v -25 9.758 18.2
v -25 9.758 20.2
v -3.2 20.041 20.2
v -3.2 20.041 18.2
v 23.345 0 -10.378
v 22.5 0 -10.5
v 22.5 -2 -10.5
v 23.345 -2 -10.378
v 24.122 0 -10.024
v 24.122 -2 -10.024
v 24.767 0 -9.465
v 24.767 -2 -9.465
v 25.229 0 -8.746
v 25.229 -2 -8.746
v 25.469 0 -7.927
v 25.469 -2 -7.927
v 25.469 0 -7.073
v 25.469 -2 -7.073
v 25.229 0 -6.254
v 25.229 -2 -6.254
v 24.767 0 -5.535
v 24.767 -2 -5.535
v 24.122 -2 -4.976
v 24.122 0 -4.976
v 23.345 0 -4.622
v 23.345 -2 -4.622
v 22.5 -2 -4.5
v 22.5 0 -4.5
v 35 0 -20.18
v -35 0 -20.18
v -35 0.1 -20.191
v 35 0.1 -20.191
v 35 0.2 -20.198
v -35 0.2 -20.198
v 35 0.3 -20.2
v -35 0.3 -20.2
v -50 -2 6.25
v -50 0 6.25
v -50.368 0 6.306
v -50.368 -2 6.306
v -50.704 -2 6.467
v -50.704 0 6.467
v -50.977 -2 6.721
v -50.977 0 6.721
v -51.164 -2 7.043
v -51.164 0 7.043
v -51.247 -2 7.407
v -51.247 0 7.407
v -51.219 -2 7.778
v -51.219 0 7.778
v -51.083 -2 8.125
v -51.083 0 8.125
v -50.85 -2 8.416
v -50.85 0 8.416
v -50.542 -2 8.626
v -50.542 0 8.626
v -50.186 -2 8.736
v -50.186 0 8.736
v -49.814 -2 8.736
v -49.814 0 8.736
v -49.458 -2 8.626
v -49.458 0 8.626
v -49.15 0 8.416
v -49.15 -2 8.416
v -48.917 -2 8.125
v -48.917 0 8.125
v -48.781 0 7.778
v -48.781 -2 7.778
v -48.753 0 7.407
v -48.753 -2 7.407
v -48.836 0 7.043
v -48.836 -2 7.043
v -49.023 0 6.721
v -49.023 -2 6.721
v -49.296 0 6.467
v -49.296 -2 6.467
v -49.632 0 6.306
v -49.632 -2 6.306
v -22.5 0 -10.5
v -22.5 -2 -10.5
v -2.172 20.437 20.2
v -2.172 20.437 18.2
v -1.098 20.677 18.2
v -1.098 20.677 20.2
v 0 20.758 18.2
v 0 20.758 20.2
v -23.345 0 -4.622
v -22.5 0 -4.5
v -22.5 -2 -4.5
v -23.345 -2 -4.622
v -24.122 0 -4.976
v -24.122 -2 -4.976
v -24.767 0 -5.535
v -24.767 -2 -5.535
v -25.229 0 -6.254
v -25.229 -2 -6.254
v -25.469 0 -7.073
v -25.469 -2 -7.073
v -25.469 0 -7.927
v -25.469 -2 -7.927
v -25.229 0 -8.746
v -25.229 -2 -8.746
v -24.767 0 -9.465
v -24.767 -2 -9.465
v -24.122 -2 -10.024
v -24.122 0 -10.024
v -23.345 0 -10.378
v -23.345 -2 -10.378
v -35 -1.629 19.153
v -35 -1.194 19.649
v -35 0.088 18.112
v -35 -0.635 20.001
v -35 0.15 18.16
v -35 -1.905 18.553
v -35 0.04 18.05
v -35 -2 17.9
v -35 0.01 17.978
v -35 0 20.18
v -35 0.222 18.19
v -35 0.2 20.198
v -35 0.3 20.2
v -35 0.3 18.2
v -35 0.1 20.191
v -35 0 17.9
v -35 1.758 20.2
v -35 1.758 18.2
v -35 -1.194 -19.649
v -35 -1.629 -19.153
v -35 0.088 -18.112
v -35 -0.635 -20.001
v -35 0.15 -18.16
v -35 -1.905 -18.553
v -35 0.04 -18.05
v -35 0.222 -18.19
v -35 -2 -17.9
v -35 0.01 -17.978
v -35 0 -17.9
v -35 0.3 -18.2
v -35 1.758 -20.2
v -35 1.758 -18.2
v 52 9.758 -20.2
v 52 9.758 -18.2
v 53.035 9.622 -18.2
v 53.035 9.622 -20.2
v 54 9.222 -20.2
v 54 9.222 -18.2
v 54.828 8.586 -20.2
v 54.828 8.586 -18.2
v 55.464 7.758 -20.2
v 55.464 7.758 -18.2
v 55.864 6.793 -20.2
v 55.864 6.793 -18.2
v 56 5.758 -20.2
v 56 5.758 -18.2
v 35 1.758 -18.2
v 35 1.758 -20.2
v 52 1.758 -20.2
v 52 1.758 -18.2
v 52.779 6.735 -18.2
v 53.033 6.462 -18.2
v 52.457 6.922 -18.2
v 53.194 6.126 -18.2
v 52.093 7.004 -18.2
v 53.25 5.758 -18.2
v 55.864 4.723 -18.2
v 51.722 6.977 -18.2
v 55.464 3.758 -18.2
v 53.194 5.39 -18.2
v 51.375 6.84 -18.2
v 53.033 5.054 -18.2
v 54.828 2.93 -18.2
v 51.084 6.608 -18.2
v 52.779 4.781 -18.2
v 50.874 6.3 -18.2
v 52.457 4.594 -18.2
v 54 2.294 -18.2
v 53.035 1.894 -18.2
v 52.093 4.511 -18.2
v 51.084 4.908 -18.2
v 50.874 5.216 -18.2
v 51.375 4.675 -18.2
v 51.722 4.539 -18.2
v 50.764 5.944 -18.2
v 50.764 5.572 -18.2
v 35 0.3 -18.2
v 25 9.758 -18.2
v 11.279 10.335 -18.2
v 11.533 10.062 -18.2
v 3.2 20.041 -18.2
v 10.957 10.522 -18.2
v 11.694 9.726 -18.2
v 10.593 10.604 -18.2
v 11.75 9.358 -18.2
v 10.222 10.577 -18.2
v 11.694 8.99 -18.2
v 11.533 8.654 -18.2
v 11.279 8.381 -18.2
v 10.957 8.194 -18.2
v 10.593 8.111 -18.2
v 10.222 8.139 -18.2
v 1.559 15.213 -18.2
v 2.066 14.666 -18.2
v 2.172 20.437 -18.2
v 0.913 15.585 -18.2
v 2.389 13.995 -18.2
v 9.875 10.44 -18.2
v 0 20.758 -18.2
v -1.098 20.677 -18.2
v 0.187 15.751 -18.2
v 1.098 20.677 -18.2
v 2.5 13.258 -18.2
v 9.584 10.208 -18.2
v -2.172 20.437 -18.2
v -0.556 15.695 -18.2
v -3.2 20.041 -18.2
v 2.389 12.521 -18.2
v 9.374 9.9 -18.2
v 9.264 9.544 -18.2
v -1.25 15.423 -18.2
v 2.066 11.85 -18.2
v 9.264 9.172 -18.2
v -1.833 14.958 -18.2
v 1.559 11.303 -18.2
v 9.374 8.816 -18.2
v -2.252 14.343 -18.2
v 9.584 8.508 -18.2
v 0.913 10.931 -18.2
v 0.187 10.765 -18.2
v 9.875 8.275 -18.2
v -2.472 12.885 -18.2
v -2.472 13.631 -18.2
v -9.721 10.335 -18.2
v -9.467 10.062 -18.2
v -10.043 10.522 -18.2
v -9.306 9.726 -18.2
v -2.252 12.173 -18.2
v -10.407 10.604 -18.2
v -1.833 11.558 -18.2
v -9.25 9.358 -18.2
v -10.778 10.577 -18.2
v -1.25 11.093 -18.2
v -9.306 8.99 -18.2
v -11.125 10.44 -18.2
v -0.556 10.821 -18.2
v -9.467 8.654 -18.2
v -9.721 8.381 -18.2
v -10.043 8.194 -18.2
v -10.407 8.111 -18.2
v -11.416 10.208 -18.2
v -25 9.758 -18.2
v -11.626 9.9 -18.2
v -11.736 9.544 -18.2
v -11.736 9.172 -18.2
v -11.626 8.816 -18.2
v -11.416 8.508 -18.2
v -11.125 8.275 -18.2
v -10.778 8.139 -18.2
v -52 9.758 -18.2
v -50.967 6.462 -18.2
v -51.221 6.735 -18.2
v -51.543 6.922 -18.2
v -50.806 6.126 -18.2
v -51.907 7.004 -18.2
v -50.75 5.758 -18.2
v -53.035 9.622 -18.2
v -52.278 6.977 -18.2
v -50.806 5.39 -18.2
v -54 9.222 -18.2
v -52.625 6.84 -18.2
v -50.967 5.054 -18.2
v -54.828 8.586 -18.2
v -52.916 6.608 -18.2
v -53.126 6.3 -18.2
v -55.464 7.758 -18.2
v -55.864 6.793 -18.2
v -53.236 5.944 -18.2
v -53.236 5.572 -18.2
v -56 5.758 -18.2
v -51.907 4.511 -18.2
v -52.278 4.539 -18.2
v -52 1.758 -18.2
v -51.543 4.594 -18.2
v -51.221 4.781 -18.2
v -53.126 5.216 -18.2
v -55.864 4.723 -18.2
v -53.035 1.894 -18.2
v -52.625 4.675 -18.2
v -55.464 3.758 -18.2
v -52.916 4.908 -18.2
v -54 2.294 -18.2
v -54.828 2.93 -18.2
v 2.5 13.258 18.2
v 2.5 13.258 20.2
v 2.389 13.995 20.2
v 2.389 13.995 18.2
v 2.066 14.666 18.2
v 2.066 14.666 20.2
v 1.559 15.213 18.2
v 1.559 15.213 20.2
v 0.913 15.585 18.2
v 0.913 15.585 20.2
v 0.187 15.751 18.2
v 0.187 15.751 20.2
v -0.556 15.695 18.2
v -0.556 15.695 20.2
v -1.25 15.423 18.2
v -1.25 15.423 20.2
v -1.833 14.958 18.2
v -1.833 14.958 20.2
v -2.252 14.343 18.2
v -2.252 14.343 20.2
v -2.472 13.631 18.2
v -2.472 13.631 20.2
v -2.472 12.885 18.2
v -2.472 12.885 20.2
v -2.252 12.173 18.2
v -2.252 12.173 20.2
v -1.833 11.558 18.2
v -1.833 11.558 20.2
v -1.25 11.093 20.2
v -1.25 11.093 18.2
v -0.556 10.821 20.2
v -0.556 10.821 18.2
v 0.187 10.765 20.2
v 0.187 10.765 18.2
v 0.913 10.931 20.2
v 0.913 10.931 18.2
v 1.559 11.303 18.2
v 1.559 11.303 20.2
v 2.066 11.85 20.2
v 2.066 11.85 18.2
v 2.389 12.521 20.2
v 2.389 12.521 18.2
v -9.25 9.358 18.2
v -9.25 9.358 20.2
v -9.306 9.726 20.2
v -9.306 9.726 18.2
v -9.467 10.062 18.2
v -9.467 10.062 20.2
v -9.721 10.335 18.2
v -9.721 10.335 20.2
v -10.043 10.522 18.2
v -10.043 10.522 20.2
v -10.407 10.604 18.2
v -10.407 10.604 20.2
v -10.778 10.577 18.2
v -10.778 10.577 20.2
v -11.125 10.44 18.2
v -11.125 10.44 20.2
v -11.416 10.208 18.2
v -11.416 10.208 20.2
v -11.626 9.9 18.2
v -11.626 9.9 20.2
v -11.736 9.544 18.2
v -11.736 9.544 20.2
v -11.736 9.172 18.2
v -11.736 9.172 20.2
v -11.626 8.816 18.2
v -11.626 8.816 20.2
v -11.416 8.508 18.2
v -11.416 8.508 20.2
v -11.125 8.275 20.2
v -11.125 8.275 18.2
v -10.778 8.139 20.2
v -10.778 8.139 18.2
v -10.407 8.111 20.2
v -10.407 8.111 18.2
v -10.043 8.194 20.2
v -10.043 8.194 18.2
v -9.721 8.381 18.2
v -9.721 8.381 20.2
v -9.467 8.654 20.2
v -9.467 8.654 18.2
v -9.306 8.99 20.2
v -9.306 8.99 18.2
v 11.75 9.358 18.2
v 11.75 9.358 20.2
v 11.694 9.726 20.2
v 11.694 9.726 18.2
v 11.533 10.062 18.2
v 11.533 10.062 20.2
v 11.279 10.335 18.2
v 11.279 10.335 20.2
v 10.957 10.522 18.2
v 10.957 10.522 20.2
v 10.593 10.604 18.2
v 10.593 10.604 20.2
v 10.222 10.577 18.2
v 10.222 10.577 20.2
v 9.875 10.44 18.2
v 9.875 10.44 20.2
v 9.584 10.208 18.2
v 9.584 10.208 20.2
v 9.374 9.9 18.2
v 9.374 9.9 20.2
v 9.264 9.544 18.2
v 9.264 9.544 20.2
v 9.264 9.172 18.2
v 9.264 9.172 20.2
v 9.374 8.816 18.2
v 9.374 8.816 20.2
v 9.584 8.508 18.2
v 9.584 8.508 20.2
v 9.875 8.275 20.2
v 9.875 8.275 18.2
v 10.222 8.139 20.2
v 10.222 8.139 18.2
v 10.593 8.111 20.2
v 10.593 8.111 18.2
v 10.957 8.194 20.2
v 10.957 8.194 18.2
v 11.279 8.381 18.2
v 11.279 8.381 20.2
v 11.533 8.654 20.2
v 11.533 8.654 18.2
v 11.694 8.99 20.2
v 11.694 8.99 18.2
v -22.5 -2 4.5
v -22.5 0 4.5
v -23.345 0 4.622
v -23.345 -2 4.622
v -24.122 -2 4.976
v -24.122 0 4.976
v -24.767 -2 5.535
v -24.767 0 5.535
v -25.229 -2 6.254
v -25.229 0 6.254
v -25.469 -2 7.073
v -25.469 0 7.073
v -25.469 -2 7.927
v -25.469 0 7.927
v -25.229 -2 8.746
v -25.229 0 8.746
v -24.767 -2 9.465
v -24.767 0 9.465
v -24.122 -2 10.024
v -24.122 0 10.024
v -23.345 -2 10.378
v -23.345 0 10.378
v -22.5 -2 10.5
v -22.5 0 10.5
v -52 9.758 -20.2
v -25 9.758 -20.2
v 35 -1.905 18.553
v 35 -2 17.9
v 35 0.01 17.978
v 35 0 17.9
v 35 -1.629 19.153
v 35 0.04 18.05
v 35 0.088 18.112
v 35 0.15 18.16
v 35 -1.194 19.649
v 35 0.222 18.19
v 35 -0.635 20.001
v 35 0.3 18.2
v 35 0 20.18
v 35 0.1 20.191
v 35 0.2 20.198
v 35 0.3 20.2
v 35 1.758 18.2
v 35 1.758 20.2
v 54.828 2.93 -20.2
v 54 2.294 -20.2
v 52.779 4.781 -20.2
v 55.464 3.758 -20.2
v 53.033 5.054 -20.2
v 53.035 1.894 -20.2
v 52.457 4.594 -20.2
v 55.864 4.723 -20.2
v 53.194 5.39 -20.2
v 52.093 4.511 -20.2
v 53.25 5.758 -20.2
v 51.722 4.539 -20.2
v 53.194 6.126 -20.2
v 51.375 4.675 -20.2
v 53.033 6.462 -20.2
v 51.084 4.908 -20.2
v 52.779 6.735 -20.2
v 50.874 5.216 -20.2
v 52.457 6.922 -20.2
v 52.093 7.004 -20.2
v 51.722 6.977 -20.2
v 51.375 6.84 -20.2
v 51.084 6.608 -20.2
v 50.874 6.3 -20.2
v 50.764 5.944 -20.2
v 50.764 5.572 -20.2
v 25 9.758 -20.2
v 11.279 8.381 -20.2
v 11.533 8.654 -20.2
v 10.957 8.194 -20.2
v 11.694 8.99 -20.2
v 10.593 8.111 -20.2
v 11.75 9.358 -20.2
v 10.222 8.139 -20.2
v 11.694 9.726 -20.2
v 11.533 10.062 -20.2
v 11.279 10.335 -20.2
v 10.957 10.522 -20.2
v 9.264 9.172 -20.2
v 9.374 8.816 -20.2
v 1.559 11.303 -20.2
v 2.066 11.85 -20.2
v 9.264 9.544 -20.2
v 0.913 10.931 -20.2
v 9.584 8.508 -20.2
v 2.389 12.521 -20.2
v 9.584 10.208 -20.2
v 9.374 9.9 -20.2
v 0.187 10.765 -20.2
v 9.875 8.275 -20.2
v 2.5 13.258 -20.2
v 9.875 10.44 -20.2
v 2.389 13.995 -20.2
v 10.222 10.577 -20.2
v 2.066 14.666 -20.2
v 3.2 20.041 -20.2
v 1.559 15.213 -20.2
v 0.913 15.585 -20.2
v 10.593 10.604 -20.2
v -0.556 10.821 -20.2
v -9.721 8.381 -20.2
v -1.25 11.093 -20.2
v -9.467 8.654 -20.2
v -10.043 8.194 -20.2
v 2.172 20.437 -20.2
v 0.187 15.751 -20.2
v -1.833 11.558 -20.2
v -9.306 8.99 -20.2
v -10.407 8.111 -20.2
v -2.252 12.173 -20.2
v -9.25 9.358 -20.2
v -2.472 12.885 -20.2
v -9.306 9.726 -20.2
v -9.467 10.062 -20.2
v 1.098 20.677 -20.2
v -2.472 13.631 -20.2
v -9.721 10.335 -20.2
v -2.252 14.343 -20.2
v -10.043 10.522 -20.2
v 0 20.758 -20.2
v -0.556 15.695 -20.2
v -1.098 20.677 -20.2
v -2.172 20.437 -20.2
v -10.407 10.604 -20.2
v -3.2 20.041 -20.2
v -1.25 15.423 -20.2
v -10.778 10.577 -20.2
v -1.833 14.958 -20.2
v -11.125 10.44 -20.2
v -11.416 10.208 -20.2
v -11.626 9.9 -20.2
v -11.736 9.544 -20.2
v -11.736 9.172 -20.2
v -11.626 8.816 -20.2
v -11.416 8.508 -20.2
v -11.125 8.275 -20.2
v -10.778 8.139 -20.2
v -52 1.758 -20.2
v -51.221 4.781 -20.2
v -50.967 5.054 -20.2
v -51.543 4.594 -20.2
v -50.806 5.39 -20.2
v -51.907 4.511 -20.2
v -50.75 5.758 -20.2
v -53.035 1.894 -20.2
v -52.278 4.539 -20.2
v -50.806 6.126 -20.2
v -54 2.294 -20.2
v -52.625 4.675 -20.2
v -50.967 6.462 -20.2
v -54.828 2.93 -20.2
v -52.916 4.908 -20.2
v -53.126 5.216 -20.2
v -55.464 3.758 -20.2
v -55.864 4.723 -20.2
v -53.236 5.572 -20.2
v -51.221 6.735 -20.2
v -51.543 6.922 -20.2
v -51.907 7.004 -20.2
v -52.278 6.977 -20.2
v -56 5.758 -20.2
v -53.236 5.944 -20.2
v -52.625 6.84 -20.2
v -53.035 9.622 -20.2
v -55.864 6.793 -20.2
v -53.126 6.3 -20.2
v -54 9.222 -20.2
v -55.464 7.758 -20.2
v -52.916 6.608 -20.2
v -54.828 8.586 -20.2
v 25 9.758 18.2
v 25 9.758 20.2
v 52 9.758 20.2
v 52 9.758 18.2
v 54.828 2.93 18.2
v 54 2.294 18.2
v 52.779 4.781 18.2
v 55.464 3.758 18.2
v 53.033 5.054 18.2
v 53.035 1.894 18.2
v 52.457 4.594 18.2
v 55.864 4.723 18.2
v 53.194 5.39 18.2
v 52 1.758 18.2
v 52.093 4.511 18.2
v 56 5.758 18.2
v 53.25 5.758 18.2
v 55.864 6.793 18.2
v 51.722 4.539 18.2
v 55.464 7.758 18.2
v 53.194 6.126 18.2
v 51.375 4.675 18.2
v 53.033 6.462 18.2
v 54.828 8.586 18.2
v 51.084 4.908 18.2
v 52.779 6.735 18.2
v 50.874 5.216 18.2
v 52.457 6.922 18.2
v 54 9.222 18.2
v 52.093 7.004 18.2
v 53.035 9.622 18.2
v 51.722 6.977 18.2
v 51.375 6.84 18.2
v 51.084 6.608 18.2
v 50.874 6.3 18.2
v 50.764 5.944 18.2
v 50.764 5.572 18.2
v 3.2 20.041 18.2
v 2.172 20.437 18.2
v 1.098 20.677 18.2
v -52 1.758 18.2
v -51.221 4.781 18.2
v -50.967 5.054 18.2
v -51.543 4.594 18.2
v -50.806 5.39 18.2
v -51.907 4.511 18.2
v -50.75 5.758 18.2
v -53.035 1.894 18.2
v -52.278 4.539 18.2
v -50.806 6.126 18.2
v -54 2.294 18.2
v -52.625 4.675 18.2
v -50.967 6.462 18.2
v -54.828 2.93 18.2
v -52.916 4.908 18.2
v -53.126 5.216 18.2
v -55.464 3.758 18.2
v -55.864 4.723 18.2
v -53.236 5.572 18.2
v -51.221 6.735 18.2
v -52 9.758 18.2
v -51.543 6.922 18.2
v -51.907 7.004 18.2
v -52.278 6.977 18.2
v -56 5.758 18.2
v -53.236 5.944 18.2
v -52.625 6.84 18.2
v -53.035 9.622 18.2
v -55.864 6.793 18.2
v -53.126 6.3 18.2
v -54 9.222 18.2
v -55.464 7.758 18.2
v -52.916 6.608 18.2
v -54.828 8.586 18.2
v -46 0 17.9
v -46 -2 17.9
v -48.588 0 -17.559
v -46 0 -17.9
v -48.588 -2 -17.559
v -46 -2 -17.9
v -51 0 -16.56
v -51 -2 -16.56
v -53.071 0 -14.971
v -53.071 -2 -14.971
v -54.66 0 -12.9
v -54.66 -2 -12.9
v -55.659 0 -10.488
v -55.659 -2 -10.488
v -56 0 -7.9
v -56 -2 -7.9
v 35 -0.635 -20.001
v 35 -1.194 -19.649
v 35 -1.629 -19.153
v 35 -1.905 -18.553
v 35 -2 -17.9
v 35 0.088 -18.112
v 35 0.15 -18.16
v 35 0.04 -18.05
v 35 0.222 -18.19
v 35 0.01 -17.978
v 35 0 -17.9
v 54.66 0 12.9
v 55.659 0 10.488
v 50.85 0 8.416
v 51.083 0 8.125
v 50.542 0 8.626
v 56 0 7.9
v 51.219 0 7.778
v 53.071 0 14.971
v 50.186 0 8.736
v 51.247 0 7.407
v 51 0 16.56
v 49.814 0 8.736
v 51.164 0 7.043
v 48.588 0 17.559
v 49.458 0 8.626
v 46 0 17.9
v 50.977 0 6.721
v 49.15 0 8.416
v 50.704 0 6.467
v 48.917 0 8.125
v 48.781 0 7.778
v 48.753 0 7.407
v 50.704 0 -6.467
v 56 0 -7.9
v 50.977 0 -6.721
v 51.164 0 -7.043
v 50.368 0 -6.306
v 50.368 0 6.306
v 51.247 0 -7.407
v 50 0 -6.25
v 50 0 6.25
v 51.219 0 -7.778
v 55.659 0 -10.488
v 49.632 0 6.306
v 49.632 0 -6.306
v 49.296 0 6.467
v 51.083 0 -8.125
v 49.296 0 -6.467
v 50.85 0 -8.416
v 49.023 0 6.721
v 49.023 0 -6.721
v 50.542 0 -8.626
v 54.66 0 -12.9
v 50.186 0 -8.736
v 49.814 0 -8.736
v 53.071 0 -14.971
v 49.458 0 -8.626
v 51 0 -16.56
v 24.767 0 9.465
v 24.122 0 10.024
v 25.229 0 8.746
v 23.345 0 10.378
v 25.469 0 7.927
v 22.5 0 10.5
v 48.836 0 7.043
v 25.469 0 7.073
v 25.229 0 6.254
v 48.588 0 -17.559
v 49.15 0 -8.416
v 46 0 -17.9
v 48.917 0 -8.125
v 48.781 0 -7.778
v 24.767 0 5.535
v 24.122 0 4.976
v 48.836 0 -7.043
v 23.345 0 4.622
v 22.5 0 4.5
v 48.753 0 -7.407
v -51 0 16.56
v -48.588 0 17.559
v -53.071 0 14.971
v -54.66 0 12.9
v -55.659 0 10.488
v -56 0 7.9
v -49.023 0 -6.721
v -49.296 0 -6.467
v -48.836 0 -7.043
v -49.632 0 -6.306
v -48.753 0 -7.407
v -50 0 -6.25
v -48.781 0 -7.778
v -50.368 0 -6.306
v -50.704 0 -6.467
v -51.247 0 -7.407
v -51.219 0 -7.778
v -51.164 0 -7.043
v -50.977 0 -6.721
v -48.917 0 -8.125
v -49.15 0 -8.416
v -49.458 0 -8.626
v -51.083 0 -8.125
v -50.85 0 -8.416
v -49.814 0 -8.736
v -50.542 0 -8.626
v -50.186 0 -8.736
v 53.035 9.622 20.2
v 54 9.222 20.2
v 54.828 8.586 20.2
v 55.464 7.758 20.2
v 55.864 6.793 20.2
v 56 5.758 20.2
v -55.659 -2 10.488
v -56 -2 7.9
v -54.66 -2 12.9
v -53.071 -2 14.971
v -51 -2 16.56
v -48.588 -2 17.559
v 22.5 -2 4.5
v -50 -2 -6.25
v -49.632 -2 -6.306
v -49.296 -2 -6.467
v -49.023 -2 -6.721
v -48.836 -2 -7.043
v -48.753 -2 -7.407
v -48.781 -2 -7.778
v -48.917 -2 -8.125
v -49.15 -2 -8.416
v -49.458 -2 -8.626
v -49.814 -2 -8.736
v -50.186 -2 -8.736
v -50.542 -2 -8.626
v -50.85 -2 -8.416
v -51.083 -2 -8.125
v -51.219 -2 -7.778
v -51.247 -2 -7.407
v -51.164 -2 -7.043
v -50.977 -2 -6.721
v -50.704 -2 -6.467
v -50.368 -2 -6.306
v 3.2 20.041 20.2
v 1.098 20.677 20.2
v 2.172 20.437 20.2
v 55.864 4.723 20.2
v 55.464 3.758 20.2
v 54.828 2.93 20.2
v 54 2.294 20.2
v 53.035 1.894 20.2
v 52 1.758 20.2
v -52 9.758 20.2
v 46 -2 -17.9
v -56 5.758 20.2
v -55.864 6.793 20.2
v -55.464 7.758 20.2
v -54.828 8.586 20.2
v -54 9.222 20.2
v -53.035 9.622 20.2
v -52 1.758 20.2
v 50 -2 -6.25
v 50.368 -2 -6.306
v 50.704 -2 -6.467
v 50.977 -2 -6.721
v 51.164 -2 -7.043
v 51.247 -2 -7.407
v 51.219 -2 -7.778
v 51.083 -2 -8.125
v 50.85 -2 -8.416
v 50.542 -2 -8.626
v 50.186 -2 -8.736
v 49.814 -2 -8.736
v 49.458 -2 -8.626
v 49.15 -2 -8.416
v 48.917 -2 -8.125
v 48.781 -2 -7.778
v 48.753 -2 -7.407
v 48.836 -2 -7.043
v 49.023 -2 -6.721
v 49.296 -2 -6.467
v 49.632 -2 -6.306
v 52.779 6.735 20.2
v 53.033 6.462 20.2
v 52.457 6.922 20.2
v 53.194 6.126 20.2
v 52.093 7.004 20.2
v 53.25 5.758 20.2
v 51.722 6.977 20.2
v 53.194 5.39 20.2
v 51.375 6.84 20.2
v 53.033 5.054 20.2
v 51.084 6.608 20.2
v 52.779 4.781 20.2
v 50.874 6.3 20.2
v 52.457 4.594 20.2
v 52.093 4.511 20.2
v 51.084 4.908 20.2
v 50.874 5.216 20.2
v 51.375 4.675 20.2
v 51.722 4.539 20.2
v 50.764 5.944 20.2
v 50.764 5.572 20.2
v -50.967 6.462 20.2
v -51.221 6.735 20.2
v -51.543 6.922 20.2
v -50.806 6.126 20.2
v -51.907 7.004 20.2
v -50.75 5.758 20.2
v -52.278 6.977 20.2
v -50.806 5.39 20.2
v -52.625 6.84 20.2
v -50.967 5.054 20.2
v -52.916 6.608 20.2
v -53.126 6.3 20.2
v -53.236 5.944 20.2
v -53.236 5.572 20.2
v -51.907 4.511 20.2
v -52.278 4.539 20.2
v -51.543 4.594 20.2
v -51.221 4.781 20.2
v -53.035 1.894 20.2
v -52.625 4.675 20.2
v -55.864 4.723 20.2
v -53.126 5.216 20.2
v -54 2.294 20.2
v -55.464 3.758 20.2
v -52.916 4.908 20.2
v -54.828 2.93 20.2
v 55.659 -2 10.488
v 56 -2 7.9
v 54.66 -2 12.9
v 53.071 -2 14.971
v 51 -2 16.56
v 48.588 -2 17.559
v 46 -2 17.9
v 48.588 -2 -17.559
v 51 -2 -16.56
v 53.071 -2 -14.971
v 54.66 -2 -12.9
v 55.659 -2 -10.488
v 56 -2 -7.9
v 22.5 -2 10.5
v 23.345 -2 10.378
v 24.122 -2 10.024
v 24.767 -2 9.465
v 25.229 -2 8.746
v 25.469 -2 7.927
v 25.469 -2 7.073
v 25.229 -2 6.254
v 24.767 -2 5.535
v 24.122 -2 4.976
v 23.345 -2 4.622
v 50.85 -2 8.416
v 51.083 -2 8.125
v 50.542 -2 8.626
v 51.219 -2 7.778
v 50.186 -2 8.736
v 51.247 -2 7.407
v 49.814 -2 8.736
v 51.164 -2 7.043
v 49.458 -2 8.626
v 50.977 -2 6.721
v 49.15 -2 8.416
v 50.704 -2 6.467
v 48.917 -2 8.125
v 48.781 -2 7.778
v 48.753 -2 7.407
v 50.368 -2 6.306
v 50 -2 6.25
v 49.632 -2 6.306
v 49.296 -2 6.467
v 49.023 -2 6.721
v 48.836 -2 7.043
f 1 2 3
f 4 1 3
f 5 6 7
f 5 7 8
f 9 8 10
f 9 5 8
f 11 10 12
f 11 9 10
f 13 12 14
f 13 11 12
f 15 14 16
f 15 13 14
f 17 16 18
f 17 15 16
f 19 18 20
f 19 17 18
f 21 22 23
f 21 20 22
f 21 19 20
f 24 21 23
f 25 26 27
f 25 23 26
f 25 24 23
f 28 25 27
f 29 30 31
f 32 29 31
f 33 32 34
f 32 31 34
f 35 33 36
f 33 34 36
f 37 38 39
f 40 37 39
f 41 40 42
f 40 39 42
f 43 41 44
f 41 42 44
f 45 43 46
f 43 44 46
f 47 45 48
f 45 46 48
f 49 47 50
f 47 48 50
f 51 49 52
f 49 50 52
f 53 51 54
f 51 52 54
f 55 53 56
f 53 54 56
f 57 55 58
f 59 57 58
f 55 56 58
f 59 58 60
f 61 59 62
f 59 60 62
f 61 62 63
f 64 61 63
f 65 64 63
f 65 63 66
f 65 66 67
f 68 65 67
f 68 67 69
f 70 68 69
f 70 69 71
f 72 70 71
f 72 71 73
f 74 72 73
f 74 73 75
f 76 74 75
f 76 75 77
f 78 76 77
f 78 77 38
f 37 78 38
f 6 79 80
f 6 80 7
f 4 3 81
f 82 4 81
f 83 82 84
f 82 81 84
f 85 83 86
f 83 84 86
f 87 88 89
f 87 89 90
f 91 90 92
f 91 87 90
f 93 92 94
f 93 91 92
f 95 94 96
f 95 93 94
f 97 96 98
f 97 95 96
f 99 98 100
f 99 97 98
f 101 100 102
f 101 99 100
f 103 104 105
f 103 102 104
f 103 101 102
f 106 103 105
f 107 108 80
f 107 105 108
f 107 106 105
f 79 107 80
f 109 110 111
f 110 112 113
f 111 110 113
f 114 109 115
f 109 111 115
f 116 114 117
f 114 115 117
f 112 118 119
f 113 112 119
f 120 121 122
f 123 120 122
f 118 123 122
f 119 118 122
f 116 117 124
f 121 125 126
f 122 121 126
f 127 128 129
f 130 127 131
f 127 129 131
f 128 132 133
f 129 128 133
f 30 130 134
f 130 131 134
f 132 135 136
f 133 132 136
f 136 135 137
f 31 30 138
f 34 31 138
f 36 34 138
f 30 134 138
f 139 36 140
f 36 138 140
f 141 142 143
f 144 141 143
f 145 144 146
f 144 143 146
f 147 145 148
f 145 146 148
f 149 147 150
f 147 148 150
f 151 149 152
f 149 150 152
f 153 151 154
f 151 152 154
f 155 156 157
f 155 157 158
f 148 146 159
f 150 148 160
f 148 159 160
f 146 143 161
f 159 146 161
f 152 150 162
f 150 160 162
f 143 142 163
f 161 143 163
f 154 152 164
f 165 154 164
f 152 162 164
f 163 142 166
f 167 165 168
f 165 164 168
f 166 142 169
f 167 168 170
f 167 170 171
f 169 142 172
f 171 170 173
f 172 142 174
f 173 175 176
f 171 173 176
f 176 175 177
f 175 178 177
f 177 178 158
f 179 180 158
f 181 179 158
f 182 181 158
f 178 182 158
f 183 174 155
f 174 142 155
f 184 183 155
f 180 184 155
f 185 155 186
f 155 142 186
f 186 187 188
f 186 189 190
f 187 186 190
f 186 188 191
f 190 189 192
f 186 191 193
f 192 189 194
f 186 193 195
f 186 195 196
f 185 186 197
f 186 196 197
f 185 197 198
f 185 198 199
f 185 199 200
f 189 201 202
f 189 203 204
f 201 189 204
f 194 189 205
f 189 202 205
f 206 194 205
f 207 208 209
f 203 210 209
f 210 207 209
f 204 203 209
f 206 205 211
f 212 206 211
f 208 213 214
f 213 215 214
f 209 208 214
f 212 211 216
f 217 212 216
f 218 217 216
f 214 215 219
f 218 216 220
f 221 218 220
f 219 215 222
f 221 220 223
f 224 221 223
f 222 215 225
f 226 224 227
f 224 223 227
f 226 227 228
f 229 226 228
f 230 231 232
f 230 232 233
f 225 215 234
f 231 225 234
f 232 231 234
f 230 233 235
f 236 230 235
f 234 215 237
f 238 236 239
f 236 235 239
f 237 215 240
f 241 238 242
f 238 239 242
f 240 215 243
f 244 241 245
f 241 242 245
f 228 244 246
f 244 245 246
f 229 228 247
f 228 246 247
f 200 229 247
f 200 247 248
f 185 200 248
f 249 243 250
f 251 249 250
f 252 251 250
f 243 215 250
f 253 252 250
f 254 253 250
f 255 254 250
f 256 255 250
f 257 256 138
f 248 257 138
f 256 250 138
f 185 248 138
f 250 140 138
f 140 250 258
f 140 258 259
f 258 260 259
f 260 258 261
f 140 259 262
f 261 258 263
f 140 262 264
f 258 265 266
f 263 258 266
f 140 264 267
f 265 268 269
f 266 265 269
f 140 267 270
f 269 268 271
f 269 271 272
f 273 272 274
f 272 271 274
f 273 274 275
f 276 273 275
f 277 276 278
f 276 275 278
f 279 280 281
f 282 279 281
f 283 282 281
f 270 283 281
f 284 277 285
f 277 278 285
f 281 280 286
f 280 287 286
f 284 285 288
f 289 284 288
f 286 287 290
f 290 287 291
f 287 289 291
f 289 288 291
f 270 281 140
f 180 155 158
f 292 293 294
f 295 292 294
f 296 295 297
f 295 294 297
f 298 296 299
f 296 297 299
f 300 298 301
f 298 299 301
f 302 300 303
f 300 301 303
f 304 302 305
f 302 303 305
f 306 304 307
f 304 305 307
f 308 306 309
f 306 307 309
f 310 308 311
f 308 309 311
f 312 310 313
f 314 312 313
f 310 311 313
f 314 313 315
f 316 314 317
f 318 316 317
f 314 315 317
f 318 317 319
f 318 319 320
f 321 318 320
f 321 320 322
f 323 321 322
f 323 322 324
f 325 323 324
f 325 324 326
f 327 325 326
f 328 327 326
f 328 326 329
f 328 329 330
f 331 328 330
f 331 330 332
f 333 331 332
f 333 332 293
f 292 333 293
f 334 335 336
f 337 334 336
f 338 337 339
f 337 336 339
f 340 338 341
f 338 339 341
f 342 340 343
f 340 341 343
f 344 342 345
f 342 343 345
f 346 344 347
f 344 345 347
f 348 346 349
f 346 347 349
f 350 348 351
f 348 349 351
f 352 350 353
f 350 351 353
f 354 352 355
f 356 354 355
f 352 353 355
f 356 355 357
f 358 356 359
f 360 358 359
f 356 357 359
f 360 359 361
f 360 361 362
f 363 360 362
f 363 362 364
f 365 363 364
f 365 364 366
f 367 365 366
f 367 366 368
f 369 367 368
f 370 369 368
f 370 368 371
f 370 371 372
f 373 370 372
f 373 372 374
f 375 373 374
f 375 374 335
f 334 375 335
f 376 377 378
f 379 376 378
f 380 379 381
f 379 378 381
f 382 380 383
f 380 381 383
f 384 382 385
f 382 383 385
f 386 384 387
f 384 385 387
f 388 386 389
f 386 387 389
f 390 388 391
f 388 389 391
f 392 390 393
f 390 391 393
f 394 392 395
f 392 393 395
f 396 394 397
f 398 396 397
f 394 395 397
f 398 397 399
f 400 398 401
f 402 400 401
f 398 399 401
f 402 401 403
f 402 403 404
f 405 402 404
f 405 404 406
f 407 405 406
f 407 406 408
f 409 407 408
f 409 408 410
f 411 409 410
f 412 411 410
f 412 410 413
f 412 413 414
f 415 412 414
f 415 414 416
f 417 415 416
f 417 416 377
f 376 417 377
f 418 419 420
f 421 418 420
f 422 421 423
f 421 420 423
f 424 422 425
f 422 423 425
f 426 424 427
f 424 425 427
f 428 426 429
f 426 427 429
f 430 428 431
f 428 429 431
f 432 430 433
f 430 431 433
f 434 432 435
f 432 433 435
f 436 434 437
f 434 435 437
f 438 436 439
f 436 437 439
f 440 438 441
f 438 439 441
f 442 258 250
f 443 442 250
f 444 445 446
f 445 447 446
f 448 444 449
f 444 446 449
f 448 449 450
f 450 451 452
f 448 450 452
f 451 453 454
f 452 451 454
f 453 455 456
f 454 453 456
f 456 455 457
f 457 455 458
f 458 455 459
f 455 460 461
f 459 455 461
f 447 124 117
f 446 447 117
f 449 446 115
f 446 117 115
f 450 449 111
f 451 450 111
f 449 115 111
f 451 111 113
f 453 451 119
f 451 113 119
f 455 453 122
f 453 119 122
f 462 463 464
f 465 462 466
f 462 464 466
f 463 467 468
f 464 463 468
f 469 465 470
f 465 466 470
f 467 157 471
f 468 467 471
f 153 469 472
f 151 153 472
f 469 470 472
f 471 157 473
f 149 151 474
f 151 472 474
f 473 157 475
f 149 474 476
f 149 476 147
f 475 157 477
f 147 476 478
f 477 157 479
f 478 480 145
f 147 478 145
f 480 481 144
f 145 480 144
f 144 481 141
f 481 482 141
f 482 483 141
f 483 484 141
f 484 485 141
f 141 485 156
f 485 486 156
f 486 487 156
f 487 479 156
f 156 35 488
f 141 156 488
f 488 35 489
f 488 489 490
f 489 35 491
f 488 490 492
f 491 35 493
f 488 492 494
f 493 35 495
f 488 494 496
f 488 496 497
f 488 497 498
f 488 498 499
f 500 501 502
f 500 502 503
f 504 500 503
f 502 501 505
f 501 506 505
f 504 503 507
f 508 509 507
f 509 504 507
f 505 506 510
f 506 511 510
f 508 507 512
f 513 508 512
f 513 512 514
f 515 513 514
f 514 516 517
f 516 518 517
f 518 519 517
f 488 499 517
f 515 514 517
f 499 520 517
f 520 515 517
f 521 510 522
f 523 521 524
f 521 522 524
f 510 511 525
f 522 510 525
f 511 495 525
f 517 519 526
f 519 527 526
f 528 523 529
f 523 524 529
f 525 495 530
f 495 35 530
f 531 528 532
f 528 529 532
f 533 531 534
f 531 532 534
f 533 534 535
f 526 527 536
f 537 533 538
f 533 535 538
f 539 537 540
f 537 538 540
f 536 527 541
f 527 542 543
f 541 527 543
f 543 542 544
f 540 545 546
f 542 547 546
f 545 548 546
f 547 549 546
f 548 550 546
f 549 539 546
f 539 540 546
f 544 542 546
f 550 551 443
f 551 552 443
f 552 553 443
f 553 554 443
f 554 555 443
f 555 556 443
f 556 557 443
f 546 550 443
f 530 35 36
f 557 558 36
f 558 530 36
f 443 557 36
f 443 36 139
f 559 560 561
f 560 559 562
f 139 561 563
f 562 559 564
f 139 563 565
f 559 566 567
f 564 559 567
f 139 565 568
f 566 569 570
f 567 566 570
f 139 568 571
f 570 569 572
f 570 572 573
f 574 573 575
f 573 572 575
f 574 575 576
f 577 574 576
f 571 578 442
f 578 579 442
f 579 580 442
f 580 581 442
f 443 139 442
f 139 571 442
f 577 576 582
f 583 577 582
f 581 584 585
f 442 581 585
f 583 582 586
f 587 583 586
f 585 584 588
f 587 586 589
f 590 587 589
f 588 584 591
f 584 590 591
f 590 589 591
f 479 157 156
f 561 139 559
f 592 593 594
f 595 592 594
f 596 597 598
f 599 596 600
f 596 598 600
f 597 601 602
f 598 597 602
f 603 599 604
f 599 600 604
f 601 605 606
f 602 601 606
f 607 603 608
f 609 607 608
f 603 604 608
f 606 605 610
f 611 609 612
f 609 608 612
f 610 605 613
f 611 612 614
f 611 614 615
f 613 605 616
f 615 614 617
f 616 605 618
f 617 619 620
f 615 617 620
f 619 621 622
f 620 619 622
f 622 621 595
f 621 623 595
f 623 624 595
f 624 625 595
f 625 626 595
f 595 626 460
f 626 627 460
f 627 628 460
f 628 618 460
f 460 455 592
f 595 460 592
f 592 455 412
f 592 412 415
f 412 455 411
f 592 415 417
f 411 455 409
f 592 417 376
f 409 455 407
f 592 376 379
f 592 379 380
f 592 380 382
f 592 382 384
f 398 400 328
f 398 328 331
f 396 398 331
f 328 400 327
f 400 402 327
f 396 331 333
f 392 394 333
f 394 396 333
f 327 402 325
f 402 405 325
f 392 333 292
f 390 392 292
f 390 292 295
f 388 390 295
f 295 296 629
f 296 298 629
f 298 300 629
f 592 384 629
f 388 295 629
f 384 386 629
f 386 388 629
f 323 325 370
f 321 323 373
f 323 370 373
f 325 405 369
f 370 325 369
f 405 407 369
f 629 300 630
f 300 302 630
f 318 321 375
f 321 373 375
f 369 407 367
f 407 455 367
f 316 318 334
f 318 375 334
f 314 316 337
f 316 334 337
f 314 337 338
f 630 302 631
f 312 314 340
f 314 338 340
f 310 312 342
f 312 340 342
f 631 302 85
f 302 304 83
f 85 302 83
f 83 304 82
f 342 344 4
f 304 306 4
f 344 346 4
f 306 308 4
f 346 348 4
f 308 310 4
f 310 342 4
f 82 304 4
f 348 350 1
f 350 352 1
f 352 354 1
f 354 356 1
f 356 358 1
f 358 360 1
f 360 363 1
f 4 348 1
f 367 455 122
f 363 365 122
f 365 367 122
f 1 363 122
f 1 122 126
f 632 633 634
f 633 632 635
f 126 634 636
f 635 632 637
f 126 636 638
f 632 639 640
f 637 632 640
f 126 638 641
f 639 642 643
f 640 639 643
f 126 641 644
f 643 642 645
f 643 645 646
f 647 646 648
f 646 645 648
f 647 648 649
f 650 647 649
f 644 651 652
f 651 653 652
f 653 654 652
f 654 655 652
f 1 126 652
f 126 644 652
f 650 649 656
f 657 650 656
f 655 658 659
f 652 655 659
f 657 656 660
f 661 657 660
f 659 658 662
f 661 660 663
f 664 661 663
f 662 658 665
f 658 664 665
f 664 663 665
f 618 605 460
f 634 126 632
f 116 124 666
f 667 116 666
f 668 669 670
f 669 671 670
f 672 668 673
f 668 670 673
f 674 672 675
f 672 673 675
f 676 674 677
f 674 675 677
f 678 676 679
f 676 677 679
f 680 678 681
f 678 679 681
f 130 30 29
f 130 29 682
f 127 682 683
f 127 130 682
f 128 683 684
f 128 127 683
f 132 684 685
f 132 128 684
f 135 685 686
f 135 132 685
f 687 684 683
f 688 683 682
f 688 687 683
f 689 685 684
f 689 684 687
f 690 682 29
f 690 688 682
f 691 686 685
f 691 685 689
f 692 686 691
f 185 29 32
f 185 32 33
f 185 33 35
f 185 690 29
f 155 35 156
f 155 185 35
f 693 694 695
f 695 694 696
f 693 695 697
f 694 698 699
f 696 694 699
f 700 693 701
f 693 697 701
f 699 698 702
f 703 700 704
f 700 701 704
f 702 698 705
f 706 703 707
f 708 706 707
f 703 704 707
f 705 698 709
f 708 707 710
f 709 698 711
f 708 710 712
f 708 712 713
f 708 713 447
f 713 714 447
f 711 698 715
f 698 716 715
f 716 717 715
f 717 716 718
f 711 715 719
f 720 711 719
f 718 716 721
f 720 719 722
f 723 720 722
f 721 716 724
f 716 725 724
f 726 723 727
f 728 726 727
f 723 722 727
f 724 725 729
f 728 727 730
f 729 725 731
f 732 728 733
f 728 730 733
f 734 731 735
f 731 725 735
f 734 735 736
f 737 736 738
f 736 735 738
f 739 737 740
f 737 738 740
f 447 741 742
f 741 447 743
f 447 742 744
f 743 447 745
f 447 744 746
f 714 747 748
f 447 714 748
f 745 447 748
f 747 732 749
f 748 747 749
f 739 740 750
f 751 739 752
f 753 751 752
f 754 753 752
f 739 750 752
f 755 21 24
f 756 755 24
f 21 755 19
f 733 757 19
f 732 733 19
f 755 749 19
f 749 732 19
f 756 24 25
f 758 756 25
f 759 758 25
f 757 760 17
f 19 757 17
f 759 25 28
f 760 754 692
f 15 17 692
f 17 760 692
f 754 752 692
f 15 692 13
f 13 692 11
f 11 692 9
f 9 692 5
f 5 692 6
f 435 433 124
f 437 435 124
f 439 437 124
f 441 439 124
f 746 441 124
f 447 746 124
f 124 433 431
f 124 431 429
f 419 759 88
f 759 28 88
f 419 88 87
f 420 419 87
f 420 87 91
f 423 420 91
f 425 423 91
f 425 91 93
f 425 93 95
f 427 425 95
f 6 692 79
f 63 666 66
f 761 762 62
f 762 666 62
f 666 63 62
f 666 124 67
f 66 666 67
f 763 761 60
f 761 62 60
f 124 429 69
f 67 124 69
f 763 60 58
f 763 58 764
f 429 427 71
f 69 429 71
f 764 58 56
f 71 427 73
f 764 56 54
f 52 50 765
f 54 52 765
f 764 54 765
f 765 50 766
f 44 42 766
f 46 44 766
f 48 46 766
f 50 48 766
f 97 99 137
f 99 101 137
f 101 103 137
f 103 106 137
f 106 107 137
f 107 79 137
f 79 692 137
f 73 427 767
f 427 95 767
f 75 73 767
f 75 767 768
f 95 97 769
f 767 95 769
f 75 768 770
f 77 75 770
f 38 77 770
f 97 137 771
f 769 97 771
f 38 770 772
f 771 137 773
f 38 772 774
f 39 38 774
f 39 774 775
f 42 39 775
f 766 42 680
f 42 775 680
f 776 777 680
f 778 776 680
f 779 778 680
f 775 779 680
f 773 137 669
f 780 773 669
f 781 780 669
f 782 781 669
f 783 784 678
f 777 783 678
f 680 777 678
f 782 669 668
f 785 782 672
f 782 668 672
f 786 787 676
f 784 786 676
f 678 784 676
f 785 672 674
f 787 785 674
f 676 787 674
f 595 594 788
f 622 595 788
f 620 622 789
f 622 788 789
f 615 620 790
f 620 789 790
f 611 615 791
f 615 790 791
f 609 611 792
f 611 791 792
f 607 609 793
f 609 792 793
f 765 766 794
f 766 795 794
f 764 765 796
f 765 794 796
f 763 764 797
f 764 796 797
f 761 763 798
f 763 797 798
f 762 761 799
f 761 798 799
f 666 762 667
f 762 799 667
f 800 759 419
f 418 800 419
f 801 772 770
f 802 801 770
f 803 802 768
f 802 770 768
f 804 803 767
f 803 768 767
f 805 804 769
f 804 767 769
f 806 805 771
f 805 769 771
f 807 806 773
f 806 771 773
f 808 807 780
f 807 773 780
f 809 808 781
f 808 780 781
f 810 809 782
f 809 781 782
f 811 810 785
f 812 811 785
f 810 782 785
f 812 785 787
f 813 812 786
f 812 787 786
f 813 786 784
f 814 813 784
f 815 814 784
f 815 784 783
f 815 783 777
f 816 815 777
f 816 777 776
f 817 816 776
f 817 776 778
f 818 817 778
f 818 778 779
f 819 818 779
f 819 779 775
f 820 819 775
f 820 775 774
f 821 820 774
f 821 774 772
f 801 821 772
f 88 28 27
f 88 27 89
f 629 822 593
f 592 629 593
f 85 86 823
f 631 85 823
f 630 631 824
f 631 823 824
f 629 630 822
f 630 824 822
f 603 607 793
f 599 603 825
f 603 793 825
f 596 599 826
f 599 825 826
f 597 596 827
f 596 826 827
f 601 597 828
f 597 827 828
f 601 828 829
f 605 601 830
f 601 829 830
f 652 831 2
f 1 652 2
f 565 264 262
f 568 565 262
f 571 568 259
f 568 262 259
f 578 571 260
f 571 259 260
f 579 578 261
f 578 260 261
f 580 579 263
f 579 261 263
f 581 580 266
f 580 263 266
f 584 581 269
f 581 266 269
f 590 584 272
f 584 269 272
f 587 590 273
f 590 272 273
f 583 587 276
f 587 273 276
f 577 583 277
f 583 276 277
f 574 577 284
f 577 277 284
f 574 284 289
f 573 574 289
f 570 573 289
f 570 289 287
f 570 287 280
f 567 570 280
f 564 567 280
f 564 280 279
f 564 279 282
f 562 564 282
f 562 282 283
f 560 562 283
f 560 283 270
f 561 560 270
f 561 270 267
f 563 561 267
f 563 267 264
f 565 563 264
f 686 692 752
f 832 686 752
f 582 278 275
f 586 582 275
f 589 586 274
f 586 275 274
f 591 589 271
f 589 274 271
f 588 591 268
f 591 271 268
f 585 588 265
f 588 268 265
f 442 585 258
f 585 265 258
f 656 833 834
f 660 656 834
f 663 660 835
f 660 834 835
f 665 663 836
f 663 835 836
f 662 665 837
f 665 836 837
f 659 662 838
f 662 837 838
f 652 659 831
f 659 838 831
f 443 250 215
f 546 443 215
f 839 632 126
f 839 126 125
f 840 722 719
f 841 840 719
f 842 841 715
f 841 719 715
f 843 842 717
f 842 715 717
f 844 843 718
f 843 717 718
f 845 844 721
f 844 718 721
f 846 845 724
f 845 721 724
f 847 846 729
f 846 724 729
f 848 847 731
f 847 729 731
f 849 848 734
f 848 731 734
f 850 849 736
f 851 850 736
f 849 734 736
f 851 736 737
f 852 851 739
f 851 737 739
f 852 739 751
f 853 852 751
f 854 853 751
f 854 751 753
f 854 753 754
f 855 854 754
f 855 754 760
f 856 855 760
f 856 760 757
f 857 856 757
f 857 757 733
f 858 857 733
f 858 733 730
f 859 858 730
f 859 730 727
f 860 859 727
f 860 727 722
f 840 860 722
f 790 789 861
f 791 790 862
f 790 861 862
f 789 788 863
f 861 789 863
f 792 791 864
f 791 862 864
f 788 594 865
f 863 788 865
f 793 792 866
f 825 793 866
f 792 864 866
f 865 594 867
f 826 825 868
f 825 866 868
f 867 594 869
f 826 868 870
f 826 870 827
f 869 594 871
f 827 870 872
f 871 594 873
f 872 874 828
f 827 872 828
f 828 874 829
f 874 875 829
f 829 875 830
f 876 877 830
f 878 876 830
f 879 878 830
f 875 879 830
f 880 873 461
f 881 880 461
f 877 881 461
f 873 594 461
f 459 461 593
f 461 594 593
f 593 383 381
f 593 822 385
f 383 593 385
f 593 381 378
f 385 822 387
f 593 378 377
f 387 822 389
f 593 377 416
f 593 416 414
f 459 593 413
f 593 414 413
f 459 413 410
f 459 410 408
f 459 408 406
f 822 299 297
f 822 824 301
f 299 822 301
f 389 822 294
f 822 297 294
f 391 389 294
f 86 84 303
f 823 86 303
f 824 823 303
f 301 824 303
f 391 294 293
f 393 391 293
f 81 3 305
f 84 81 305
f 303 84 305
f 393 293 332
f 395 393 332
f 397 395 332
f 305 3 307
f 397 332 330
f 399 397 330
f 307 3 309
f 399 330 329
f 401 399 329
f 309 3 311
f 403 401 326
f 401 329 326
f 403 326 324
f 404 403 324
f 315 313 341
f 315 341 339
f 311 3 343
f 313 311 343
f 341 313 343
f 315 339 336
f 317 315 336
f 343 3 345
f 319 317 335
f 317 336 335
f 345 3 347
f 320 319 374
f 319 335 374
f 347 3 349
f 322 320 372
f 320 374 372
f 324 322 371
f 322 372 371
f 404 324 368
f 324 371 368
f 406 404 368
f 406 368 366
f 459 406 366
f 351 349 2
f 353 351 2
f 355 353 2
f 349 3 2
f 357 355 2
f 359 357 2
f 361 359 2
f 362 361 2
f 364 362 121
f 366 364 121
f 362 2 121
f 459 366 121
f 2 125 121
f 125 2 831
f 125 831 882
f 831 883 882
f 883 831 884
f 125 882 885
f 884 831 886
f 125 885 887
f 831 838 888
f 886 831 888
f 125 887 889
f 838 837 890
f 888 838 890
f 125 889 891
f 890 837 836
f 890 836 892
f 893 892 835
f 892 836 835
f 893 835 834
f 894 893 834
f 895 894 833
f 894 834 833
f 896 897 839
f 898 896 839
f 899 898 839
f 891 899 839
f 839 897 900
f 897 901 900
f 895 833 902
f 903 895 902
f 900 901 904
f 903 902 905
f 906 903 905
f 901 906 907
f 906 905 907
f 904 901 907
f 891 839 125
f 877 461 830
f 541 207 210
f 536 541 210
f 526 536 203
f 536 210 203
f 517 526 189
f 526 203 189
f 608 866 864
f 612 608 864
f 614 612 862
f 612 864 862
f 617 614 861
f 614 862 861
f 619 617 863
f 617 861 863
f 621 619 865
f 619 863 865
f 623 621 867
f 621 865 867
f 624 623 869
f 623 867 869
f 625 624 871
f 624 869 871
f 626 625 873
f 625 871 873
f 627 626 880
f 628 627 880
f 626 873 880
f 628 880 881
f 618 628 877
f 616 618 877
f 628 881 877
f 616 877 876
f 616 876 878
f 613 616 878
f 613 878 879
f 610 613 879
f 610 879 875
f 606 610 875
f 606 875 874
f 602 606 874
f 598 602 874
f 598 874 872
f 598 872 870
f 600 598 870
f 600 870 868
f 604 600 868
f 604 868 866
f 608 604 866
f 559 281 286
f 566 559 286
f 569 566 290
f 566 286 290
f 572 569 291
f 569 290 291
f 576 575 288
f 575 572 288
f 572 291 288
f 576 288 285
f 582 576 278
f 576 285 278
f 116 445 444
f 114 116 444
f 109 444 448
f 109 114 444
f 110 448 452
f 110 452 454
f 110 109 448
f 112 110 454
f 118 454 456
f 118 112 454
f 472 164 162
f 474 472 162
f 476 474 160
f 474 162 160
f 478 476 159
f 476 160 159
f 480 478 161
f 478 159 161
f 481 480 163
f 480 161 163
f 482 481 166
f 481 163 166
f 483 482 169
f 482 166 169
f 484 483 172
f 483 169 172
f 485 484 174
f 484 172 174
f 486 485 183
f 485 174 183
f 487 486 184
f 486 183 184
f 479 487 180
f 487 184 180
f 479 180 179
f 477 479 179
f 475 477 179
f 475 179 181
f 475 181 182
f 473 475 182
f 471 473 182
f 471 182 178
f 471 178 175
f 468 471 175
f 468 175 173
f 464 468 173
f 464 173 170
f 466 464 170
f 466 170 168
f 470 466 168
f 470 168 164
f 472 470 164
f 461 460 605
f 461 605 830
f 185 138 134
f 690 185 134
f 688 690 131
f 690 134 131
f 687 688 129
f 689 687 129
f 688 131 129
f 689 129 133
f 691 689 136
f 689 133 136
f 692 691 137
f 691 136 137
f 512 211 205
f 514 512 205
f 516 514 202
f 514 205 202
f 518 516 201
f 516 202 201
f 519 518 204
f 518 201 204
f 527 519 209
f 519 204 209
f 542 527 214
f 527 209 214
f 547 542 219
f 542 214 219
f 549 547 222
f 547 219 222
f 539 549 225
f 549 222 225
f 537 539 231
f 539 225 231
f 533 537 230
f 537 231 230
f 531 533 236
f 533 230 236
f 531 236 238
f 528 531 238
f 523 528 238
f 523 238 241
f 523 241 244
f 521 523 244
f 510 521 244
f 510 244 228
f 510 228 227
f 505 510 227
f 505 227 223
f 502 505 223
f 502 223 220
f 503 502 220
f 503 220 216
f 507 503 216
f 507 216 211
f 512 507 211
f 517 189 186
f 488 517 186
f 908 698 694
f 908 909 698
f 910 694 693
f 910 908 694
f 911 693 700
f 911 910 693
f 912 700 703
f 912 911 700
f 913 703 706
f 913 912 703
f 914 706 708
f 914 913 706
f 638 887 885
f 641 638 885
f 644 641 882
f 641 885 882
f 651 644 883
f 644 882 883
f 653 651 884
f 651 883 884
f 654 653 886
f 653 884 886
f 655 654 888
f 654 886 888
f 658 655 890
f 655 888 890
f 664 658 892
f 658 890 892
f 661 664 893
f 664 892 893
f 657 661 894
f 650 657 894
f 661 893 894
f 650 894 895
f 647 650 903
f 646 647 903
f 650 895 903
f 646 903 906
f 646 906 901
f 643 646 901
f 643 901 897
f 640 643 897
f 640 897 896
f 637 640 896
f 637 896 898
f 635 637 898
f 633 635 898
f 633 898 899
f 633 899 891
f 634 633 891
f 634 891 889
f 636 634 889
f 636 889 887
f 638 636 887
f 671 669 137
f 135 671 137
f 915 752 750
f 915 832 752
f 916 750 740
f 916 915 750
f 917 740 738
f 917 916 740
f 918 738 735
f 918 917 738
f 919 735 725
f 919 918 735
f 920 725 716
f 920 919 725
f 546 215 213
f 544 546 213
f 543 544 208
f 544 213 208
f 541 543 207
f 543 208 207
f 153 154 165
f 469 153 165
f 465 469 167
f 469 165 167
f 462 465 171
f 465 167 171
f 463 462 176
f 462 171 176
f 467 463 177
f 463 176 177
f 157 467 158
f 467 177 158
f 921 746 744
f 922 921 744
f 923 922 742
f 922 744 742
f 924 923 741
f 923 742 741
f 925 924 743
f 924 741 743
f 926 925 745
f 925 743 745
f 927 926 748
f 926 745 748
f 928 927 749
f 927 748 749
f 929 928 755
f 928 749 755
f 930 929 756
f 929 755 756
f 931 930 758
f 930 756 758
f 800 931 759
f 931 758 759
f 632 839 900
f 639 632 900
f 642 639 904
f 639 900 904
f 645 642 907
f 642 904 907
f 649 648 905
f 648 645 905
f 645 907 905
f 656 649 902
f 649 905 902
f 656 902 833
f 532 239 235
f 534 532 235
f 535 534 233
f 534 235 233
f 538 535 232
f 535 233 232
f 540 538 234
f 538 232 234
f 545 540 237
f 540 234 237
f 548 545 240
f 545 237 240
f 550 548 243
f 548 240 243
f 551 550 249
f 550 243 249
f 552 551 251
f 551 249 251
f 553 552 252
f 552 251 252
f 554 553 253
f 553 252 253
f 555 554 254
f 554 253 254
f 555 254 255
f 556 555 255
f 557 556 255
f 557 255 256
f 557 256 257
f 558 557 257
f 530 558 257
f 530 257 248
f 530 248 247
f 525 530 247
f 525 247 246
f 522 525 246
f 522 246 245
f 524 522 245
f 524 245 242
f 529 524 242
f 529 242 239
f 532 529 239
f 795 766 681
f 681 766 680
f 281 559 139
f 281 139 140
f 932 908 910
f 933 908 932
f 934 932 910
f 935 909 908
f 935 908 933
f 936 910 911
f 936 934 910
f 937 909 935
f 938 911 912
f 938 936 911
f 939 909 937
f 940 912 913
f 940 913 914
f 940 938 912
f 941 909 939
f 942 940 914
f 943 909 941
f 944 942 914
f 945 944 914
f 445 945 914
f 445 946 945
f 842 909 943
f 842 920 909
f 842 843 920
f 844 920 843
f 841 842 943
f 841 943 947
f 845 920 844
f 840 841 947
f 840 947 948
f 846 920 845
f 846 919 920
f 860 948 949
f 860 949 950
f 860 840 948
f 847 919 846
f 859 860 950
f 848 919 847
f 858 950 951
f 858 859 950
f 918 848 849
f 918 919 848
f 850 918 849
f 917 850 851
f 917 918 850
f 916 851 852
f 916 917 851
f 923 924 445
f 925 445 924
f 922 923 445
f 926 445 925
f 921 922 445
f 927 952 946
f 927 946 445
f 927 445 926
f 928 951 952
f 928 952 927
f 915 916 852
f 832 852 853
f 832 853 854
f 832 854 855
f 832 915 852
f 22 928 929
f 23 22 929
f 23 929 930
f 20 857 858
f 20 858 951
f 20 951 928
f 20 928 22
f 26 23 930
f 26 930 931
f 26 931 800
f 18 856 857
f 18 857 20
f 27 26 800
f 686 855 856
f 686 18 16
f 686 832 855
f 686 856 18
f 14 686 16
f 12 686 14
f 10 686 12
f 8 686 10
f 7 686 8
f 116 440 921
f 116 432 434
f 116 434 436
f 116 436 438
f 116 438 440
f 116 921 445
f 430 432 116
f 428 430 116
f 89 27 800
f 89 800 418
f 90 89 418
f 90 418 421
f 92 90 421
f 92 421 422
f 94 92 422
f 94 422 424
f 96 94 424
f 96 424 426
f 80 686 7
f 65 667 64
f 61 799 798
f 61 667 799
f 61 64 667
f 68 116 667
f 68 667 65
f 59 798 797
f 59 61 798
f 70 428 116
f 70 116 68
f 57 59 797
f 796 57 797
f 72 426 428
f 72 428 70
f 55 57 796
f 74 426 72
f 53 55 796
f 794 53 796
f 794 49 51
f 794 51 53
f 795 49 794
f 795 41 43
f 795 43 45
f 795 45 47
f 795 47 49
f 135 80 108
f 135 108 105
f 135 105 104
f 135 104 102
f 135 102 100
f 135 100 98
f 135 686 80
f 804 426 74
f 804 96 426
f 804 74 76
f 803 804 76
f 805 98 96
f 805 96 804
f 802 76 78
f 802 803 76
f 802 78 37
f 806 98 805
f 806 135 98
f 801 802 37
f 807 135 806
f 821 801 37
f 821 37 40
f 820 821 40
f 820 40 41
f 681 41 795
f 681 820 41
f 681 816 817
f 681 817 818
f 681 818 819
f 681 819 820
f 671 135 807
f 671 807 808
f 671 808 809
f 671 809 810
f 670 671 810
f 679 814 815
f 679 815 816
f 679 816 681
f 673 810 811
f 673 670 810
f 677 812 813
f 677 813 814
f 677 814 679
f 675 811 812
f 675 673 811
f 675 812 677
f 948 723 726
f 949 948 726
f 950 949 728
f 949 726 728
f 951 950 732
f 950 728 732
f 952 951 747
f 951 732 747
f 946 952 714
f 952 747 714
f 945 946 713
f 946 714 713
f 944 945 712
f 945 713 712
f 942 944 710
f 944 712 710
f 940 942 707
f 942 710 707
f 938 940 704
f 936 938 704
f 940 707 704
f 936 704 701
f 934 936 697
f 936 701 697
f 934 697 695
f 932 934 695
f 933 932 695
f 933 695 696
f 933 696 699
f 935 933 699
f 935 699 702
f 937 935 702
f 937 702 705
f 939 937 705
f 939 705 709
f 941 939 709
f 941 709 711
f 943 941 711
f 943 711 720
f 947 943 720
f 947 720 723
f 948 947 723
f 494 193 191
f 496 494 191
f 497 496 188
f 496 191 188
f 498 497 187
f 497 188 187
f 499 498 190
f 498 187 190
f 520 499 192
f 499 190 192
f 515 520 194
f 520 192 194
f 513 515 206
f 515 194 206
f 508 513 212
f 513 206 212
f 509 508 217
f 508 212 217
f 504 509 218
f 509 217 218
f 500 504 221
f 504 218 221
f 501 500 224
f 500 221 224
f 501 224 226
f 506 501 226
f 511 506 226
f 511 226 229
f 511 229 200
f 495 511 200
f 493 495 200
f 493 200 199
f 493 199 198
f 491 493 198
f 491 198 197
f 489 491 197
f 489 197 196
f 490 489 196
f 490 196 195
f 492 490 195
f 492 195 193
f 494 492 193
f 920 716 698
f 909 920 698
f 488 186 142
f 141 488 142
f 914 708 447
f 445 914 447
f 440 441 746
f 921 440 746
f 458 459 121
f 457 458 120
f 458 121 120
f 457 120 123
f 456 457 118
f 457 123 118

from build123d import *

# Parameters (mm, degrees)
BRIDA_BASE1_DEPTH               = 2
PLIEGUE_START                   = -56
PLIEGUE_CROQUIZADO2_DEPTH       = 112
PLIEGUE_CROQUIZADO2_2_OUTLINE_W = 19
PLIEGUE_CROQUIZADO2_2_OUTLINE_H = 2
PLIEGUE_CROQUIZADO2_2_DEPTH     = 112
PLIEGUE_START_2                 = -35
PLIEGUE_CROQUIZADO2_3_DEPTH     = 70
CROQUIS10_R                     = 1.25
CROQUIS10_R_2                   = 2.5
CORTAR_EXTRUIR2_DEPTH           = 73.104459651
CROQUIS11_R                     = 1.25
CORTAR_EXTRUIR3_DEPTH           = 10
REDONDEO1_R                     = 10


# Read off the part's stored shape, not the designer's step: Pliegue croquizado2
# Sheet-metal steps are written as plain solids
with BuildPart() as part:
    # Croquis base → Brida base1 (new body)
    with BuildSketch(Plane(origin=(0, 0, 0), x_dir=(1, 0, 0), z_dir=(0, 1, 0))):
        Polygon((56, 17.9), (56, -17.9), (35, -17.9), (35, -21.4), (56, -21.4), (56, -40.4), (-56, -40.4), (-56, -21.4), (-35, -21.4), (-35, -17.9), (-56, -17.9), (-56, 17.9), (-35, 17.9), (-35, 21.4), (-56, 21.4), (-56, 40.4), (56, 40.4), (56, 21.4), (35, 21.4), (35, 17.9), align=None)
    extrude(amount=-BRIDA_BASE1_DEPTH)

    # Pliegue croquizado2 outline → Pliegue croquizado2 (cut)
    with BuildSketch(Plane.YZ.offset(PLIEGUE_START)):
        with BuildLine():
            ThreePointArc((0, -20.18035085), (-1.429161647, -19.416575089), (-2, -17.9))
            Line((-2, -17.9), (-2, -40.4))
            Line((-2, -40.4), (0, -40.4))
            Line((0, -40.4), (0, -20.18035085))
        make_face()
        with BuildLine():
            ThreePointArc((-2, 17.9), (-1.429161647, 19.416575089), (0, 20.18035085))
            Line((0, 20.18035085), (0, 40.4))
            Line((0, 40.4), (-2, 40.4))
            Line((-2, 40.4), (-2, 17.9))
        make_face()
    extrude(amount=PLIEGUE_CROQUIZADO2_DEPTH, mode=Mode.SUBTRACT)



with BuildPart() as body_2:
    # Pliegue croquizado2 2 outline → Pliegue croquizado2 2 (new body)
    with BuildSketch(Plane.YZ.offset(PLIEGUE_START)):
        with Locations((11.257964775, -19.2)):
            Rectangle(PLIEGUE_CROQUIZADO2_2_OUTLINE_W, PLIEGUE_CROQUIZADO2_2_OUTLINE_H)
        with Locations((11.257964775, 19.2)):
            Rectangle(PLIEGUE_CROQUIZADO2_2_OUTLINE_W, PLIEGUE_CROQUIZADO2_2_OUTLINE_H)
    extrude(amount=PLIEGUE_CROQUIZADO2_2_DEPTH)


with BuildPart() as part_1:
    add(part.part)

    add(body_2.part)  # Pliegue croquizado2 3 merges body 2
    # Pliegue croquizado2 3 outline → Pliegue croquizado2 3 (add)
    with BuildSketch(Plane.YZ.offset(PLIEGUE_START_2)):
        with BuildLine():
            Line((0, -17.9), (0, -20.18035085))
            ThreePointArc((0, -20.18035085), (0.149678603, -20.195082456), (0.3, -20.2))
            Line((0.3, -20.2), (1.757964775, -20.2))
            Line((1.757964775, -20.2), (1.757964775, -18.2))
            Line((1.757964775, -18.2), (0.3, -18.2))
            ThreePointArc((0.3, -18.2), (0.087867966, -18.112132034), (0, -17.9))
        make_face()
        with BuildLine():
            ThreePointArc((0.3, 20.2), (0.149678603, 20.195082456), (0, 20.18035085))
            Line((0, 20.18035085), (0, 17.9))
            ThreePointArc((0, 17.9), (0.087867966, 18.112132034), (0.3, 18.2))
            Line((0.3, 18.2), (1.757964775, 18.2))
            Line((1.757964775, 18.2), (1.757964775, 20.2))
            Line((1.757964775, 20.2), (0.3, 20.2))
        make_face()
    extrude(amount=PLIEGUE_CROQUIZADO2_3_DEPTH)

    # Croquis10 → Cortar-Extruir2 (cut, through all)
    with BuildSketch(Plane.XY.offset(20.2)):
        with BuildLine():
            ThreePointArc((-56, 5.757964775), (-54.828427125, 8.5863919), (-52, 9.757964775))
            Line((-52, 9.757964775), (-25, 9.757964775))
            Line((-25, 9.757964775), (-3.19965236, 20.041195921))
            ThreePointArc((-3.19965236, 20.041195921), (-1.639476503, 20.576579179), (0, 20.757964775))
            Line((0, 20.757964775), (-56, 20.757964775))
            Line((-56, 20.757964775), (-56, 5.757964775))
        make_face()
        with BuildLine():
            ThreePointArc((-52, 1.757964775), (-54.828427125, 2.92953765), (-56, 5.757964775))
            Line((-56, 5.757964775), (-56, 1.757964775))
            Line((-56, 1.757964775), (-52, 1.757964775))
        make_face()
        with BuildLine():
            Line((56, 20.757964775), (0, 20.757964775))
            ThreePointArc((0, 20.757964775), (1.639476503, 20.576579179), (3.19965236, 20.041195921))
            Line((3.19965236, 20.041195921), (25, 9.757964775))
            Line((25, 9.757964775), (52, 9.757964775))
            ThreePointArc((52, 9.757964775), (54.828427125, 8.5863919), (56, 5.757964775))
            Line((56, 5.757964775), (56, 20.757964775))
        make_face()
        with BuildLine():
            Line((56, 1.757964775), (56, 5.757964775))
            ThreePointArc((56, 5.757964775), (54.828427125, 2.92953765), (52, 1.757964775))
            Line((52, 1.757964775), (56, 1.757964775))
        make_face()
        with Locations((52, 5.757964775)):
            Circle(CROQUIS10_R)
        with Locations((10.5, 9.357964775)):
            Circle(CROQUIS10_R)
        with Locations((-10.5, 9.357964775)):
            Circle(CROQUIS10_R)
        with Locations((0, 13.257964775)):
            Circle(CROQUIS10_R_2)
        with Locations((-52, 5.757964775)):
            Circle(CROQUIS10_R)
    extrude(amount=-CORTAR_EXTRUIR2_DEPTH, mode=Mode.SUBTRACT)

    # Croquis11 → Cortar-Extruir3 (cut)
    with BuildSketch(Plane(origin=(0, 0, 0), x_dir=(1, 0, 0), z_dir=(0, 1, 0))):
        with Locations(Location((-50, 7.5, 0), (0, 0, 270))):
            Circle(CROQUIS11_R)
        with Locations(Location((50, 7.5, 0), (0, 0, 270))):
            Circle(CROQUIS11_R)
        with Locations(Location((50, -7.5, 0), (0, 0, 90))):
            Circle(CROQUIS11_R)
        with Locations(Location((-50, -7.5, 0), (0, 0, 90))):
            Circle(CROQUIS11_R)
        with BuildLine():
            Line((-22.5, 10.5), (22.5, 10.5))
            ThreePointArc((22.5, 10.5), (25.5, 7.5), (22.5, 4.5))
            Line((22.5, 4.5), (-22.5, 4.5))
            ThreePointArc((-22.5, 4.5), (-25.5, 7.5), (-22.5, 10.5))
        make_face()
        with BuildLine():
            Line((-22.5, -10.5), (22.5, -10.5))
            ThreePointArc((22.5, -10.5), (25.5, -7.5), (22.5, -4.5))
            Line((22.5, -4.5), (-22.5, -4.5))
            ThreePointArc((-22.5, -4.5), (-25.5, -7.5), (-22.5, -10.5))
        make_face()
    extrude(amount=-CORTAR_EXTRUIR3_DEPTH, mode=Mode.SUBTRACT)

    # Redondeo1
    redondeo1_edges = [part_1.edges().sort_by_distance(p)[0] for p in [
        (-56, -1, 17.9),
        (-56, -1, -17.9),
        (56, -1, -17.9),
        (56, -1, 17.9),
    ]]
    fillet(redondeo1_edges, radius=REDONDEO1_R)


solid = part_1.part
